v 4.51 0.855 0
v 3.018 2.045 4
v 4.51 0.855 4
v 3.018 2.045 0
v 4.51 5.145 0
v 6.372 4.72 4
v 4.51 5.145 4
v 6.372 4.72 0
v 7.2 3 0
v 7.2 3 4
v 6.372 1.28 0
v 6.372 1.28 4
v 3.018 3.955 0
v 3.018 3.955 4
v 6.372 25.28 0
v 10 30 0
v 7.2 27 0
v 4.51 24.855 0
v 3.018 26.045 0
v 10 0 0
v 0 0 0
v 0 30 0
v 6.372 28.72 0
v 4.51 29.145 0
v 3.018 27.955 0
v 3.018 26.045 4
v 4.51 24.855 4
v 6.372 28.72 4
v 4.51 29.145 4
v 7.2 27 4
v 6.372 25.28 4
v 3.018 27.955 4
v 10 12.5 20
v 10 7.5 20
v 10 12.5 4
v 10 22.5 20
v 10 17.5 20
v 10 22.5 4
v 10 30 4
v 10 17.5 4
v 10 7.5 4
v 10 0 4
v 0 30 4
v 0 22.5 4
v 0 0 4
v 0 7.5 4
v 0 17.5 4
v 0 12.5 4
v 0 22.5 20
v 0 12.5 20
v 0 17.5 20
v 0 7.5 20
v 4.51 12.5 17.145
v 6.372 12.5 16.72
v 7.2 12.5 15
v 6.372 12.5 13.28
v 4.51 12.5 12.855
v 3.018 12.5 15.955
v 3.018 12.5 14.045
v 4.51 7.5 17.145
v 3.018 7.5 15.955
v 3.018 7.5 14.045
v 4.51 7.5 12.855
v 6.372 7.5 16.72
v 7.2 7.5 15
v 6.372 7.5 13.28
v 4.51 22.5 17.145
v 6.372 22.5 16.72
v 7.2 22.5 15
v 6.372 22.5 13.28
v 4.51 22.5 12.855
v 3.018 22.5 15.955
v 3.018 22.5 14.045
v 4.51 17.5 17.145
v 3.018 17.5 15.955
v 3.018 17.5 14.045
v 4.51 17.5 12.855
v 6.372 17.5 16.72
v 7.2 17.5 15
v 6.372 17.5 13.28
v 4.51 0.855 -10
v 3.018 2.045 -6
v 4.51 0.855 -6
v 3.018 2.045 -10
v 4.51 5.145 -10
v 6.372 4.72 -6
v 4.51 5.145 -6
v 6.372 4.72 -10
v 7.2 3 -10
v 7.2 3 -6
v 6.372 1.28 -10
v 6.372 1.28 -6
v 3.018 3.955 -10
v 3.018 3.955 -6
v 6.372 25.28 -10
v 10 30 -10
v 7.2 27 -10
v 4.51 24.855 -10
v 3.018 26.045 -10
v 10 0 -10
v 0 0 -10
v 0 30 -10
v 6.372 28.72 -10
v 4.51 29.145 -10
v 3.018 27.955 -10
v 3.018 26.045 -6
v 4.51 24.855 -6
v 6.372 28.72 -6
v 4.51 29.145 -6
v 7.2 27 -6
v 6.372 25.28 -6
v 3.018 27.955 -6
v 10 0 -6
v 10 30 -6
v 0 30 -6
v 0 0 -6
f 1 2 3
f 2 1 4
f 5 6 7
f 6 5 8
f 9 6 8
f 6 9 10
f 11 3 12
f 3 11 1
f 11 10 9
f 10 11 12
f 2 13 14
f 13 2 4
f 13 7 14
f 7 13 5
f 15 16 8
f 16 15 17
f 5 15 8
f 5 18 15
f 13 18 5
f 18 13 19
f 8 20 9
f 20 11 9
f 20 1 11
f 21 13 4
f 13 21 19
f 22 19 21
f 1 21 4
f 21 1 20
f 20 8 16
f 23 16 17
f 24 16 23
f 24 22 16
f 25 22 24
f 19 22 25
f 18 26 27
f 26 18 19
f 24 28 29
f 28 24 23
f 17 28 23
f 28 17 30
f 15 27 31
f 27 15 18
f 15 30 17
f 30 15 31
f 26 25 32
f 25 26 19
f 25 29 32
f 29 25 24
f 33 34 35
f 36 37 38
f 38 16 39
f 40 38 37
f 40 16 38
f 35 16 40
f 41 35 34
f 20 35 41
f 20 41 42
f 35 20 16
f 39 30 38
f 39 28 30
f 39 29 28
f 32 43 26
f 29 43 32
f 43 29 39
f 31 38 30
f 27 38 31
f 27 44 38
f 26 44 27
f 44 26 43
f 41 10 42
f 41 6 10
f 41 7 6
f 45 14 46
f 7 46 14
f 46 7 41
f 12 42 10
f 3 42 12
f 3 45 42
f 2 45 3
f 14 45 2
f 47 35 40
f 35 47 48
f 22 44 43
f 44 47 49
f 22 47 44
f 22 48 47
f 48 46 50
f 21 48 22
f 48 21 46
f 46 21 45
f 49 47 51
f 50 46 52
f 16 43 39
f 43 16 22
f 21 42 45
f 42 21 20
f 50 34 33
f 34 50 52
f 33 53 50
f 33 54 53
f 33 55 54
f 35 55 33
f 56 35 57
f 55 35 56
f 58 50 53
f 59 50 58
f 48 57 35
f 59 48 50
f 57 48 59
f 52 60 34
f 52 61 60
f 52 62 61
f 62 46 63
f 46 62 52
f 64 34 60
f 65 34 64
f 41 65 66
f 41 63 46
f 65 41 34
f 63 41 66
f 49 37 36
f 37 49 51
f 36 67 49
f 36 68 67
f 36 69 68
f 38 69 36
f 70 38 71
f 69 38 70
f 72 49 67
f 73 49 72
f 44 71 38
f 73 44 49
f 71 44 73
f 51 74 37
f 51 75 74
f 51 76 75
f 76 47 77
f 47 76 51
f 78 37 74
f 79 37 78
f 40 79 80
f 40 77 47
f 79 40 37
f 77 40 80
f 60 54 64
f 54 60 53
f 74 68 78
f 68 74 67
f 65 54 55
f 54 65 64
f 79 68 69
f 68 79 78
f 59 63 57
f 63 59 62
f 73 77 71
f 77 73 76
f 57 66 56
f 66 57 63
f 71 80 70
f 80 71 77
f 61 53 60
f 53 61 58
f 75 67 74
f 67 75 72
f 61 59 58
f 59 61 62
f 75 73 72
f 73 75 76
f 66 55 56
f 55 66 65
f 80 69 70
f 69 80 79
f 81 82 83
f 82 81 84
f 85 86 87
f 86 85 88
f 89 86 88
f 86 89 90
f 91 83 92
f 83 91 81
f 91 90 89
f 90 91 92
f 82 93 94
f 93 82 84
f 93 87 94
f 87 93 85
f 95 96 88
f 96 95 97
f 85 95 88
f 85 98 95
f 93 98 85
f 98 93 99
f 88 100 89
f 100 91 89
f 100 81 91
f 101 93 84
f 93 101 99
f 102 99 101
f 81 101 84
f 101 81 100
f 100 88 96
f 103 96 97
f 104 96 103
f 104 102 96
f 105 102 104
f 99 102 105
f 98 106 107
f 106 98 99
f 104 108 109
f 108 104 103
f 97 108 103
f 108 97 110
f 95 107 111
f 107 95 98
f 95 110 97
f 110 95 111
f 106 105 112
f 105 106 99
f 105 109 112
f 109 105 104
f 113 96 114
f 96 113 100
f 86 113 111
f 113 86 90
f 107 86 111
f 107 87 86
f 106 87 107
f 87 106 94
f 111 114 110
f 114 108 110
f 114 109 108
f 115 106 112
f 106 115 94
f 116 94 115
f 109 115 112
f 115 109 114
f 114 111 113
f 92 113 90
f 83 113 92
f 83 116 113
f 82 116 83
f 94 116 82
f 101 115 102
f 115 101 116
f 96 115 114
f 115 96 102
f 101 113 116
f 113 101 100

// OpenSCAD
difference(){
  cube([10,24+3+3,4]);
  union(){
    translate([5,3,0]) cylinder(r=2.2,h=100);
    translate([5,24+3,0]) cylinder(r=2.2,h=100);
  }
}

difference(){
  union(){
    translate([0,7.5,0])cube([10,5,20]);
    translate([0,30-7.5-5,0])cube([10,5,20]);
  }
  translate([5,50,15])  rotate([90,0,0]) cylinder(r=2.2,h=100);
}




translate([0,0,-10]){
difference(){
  cube([10,24+3+3,4]);
  union(){
    translate([5,3,0]) cylinder(r=2.2,h=100);
    translate([5,24+3,0]) cylinder(r=2.2,h=100);
  }
}
}
